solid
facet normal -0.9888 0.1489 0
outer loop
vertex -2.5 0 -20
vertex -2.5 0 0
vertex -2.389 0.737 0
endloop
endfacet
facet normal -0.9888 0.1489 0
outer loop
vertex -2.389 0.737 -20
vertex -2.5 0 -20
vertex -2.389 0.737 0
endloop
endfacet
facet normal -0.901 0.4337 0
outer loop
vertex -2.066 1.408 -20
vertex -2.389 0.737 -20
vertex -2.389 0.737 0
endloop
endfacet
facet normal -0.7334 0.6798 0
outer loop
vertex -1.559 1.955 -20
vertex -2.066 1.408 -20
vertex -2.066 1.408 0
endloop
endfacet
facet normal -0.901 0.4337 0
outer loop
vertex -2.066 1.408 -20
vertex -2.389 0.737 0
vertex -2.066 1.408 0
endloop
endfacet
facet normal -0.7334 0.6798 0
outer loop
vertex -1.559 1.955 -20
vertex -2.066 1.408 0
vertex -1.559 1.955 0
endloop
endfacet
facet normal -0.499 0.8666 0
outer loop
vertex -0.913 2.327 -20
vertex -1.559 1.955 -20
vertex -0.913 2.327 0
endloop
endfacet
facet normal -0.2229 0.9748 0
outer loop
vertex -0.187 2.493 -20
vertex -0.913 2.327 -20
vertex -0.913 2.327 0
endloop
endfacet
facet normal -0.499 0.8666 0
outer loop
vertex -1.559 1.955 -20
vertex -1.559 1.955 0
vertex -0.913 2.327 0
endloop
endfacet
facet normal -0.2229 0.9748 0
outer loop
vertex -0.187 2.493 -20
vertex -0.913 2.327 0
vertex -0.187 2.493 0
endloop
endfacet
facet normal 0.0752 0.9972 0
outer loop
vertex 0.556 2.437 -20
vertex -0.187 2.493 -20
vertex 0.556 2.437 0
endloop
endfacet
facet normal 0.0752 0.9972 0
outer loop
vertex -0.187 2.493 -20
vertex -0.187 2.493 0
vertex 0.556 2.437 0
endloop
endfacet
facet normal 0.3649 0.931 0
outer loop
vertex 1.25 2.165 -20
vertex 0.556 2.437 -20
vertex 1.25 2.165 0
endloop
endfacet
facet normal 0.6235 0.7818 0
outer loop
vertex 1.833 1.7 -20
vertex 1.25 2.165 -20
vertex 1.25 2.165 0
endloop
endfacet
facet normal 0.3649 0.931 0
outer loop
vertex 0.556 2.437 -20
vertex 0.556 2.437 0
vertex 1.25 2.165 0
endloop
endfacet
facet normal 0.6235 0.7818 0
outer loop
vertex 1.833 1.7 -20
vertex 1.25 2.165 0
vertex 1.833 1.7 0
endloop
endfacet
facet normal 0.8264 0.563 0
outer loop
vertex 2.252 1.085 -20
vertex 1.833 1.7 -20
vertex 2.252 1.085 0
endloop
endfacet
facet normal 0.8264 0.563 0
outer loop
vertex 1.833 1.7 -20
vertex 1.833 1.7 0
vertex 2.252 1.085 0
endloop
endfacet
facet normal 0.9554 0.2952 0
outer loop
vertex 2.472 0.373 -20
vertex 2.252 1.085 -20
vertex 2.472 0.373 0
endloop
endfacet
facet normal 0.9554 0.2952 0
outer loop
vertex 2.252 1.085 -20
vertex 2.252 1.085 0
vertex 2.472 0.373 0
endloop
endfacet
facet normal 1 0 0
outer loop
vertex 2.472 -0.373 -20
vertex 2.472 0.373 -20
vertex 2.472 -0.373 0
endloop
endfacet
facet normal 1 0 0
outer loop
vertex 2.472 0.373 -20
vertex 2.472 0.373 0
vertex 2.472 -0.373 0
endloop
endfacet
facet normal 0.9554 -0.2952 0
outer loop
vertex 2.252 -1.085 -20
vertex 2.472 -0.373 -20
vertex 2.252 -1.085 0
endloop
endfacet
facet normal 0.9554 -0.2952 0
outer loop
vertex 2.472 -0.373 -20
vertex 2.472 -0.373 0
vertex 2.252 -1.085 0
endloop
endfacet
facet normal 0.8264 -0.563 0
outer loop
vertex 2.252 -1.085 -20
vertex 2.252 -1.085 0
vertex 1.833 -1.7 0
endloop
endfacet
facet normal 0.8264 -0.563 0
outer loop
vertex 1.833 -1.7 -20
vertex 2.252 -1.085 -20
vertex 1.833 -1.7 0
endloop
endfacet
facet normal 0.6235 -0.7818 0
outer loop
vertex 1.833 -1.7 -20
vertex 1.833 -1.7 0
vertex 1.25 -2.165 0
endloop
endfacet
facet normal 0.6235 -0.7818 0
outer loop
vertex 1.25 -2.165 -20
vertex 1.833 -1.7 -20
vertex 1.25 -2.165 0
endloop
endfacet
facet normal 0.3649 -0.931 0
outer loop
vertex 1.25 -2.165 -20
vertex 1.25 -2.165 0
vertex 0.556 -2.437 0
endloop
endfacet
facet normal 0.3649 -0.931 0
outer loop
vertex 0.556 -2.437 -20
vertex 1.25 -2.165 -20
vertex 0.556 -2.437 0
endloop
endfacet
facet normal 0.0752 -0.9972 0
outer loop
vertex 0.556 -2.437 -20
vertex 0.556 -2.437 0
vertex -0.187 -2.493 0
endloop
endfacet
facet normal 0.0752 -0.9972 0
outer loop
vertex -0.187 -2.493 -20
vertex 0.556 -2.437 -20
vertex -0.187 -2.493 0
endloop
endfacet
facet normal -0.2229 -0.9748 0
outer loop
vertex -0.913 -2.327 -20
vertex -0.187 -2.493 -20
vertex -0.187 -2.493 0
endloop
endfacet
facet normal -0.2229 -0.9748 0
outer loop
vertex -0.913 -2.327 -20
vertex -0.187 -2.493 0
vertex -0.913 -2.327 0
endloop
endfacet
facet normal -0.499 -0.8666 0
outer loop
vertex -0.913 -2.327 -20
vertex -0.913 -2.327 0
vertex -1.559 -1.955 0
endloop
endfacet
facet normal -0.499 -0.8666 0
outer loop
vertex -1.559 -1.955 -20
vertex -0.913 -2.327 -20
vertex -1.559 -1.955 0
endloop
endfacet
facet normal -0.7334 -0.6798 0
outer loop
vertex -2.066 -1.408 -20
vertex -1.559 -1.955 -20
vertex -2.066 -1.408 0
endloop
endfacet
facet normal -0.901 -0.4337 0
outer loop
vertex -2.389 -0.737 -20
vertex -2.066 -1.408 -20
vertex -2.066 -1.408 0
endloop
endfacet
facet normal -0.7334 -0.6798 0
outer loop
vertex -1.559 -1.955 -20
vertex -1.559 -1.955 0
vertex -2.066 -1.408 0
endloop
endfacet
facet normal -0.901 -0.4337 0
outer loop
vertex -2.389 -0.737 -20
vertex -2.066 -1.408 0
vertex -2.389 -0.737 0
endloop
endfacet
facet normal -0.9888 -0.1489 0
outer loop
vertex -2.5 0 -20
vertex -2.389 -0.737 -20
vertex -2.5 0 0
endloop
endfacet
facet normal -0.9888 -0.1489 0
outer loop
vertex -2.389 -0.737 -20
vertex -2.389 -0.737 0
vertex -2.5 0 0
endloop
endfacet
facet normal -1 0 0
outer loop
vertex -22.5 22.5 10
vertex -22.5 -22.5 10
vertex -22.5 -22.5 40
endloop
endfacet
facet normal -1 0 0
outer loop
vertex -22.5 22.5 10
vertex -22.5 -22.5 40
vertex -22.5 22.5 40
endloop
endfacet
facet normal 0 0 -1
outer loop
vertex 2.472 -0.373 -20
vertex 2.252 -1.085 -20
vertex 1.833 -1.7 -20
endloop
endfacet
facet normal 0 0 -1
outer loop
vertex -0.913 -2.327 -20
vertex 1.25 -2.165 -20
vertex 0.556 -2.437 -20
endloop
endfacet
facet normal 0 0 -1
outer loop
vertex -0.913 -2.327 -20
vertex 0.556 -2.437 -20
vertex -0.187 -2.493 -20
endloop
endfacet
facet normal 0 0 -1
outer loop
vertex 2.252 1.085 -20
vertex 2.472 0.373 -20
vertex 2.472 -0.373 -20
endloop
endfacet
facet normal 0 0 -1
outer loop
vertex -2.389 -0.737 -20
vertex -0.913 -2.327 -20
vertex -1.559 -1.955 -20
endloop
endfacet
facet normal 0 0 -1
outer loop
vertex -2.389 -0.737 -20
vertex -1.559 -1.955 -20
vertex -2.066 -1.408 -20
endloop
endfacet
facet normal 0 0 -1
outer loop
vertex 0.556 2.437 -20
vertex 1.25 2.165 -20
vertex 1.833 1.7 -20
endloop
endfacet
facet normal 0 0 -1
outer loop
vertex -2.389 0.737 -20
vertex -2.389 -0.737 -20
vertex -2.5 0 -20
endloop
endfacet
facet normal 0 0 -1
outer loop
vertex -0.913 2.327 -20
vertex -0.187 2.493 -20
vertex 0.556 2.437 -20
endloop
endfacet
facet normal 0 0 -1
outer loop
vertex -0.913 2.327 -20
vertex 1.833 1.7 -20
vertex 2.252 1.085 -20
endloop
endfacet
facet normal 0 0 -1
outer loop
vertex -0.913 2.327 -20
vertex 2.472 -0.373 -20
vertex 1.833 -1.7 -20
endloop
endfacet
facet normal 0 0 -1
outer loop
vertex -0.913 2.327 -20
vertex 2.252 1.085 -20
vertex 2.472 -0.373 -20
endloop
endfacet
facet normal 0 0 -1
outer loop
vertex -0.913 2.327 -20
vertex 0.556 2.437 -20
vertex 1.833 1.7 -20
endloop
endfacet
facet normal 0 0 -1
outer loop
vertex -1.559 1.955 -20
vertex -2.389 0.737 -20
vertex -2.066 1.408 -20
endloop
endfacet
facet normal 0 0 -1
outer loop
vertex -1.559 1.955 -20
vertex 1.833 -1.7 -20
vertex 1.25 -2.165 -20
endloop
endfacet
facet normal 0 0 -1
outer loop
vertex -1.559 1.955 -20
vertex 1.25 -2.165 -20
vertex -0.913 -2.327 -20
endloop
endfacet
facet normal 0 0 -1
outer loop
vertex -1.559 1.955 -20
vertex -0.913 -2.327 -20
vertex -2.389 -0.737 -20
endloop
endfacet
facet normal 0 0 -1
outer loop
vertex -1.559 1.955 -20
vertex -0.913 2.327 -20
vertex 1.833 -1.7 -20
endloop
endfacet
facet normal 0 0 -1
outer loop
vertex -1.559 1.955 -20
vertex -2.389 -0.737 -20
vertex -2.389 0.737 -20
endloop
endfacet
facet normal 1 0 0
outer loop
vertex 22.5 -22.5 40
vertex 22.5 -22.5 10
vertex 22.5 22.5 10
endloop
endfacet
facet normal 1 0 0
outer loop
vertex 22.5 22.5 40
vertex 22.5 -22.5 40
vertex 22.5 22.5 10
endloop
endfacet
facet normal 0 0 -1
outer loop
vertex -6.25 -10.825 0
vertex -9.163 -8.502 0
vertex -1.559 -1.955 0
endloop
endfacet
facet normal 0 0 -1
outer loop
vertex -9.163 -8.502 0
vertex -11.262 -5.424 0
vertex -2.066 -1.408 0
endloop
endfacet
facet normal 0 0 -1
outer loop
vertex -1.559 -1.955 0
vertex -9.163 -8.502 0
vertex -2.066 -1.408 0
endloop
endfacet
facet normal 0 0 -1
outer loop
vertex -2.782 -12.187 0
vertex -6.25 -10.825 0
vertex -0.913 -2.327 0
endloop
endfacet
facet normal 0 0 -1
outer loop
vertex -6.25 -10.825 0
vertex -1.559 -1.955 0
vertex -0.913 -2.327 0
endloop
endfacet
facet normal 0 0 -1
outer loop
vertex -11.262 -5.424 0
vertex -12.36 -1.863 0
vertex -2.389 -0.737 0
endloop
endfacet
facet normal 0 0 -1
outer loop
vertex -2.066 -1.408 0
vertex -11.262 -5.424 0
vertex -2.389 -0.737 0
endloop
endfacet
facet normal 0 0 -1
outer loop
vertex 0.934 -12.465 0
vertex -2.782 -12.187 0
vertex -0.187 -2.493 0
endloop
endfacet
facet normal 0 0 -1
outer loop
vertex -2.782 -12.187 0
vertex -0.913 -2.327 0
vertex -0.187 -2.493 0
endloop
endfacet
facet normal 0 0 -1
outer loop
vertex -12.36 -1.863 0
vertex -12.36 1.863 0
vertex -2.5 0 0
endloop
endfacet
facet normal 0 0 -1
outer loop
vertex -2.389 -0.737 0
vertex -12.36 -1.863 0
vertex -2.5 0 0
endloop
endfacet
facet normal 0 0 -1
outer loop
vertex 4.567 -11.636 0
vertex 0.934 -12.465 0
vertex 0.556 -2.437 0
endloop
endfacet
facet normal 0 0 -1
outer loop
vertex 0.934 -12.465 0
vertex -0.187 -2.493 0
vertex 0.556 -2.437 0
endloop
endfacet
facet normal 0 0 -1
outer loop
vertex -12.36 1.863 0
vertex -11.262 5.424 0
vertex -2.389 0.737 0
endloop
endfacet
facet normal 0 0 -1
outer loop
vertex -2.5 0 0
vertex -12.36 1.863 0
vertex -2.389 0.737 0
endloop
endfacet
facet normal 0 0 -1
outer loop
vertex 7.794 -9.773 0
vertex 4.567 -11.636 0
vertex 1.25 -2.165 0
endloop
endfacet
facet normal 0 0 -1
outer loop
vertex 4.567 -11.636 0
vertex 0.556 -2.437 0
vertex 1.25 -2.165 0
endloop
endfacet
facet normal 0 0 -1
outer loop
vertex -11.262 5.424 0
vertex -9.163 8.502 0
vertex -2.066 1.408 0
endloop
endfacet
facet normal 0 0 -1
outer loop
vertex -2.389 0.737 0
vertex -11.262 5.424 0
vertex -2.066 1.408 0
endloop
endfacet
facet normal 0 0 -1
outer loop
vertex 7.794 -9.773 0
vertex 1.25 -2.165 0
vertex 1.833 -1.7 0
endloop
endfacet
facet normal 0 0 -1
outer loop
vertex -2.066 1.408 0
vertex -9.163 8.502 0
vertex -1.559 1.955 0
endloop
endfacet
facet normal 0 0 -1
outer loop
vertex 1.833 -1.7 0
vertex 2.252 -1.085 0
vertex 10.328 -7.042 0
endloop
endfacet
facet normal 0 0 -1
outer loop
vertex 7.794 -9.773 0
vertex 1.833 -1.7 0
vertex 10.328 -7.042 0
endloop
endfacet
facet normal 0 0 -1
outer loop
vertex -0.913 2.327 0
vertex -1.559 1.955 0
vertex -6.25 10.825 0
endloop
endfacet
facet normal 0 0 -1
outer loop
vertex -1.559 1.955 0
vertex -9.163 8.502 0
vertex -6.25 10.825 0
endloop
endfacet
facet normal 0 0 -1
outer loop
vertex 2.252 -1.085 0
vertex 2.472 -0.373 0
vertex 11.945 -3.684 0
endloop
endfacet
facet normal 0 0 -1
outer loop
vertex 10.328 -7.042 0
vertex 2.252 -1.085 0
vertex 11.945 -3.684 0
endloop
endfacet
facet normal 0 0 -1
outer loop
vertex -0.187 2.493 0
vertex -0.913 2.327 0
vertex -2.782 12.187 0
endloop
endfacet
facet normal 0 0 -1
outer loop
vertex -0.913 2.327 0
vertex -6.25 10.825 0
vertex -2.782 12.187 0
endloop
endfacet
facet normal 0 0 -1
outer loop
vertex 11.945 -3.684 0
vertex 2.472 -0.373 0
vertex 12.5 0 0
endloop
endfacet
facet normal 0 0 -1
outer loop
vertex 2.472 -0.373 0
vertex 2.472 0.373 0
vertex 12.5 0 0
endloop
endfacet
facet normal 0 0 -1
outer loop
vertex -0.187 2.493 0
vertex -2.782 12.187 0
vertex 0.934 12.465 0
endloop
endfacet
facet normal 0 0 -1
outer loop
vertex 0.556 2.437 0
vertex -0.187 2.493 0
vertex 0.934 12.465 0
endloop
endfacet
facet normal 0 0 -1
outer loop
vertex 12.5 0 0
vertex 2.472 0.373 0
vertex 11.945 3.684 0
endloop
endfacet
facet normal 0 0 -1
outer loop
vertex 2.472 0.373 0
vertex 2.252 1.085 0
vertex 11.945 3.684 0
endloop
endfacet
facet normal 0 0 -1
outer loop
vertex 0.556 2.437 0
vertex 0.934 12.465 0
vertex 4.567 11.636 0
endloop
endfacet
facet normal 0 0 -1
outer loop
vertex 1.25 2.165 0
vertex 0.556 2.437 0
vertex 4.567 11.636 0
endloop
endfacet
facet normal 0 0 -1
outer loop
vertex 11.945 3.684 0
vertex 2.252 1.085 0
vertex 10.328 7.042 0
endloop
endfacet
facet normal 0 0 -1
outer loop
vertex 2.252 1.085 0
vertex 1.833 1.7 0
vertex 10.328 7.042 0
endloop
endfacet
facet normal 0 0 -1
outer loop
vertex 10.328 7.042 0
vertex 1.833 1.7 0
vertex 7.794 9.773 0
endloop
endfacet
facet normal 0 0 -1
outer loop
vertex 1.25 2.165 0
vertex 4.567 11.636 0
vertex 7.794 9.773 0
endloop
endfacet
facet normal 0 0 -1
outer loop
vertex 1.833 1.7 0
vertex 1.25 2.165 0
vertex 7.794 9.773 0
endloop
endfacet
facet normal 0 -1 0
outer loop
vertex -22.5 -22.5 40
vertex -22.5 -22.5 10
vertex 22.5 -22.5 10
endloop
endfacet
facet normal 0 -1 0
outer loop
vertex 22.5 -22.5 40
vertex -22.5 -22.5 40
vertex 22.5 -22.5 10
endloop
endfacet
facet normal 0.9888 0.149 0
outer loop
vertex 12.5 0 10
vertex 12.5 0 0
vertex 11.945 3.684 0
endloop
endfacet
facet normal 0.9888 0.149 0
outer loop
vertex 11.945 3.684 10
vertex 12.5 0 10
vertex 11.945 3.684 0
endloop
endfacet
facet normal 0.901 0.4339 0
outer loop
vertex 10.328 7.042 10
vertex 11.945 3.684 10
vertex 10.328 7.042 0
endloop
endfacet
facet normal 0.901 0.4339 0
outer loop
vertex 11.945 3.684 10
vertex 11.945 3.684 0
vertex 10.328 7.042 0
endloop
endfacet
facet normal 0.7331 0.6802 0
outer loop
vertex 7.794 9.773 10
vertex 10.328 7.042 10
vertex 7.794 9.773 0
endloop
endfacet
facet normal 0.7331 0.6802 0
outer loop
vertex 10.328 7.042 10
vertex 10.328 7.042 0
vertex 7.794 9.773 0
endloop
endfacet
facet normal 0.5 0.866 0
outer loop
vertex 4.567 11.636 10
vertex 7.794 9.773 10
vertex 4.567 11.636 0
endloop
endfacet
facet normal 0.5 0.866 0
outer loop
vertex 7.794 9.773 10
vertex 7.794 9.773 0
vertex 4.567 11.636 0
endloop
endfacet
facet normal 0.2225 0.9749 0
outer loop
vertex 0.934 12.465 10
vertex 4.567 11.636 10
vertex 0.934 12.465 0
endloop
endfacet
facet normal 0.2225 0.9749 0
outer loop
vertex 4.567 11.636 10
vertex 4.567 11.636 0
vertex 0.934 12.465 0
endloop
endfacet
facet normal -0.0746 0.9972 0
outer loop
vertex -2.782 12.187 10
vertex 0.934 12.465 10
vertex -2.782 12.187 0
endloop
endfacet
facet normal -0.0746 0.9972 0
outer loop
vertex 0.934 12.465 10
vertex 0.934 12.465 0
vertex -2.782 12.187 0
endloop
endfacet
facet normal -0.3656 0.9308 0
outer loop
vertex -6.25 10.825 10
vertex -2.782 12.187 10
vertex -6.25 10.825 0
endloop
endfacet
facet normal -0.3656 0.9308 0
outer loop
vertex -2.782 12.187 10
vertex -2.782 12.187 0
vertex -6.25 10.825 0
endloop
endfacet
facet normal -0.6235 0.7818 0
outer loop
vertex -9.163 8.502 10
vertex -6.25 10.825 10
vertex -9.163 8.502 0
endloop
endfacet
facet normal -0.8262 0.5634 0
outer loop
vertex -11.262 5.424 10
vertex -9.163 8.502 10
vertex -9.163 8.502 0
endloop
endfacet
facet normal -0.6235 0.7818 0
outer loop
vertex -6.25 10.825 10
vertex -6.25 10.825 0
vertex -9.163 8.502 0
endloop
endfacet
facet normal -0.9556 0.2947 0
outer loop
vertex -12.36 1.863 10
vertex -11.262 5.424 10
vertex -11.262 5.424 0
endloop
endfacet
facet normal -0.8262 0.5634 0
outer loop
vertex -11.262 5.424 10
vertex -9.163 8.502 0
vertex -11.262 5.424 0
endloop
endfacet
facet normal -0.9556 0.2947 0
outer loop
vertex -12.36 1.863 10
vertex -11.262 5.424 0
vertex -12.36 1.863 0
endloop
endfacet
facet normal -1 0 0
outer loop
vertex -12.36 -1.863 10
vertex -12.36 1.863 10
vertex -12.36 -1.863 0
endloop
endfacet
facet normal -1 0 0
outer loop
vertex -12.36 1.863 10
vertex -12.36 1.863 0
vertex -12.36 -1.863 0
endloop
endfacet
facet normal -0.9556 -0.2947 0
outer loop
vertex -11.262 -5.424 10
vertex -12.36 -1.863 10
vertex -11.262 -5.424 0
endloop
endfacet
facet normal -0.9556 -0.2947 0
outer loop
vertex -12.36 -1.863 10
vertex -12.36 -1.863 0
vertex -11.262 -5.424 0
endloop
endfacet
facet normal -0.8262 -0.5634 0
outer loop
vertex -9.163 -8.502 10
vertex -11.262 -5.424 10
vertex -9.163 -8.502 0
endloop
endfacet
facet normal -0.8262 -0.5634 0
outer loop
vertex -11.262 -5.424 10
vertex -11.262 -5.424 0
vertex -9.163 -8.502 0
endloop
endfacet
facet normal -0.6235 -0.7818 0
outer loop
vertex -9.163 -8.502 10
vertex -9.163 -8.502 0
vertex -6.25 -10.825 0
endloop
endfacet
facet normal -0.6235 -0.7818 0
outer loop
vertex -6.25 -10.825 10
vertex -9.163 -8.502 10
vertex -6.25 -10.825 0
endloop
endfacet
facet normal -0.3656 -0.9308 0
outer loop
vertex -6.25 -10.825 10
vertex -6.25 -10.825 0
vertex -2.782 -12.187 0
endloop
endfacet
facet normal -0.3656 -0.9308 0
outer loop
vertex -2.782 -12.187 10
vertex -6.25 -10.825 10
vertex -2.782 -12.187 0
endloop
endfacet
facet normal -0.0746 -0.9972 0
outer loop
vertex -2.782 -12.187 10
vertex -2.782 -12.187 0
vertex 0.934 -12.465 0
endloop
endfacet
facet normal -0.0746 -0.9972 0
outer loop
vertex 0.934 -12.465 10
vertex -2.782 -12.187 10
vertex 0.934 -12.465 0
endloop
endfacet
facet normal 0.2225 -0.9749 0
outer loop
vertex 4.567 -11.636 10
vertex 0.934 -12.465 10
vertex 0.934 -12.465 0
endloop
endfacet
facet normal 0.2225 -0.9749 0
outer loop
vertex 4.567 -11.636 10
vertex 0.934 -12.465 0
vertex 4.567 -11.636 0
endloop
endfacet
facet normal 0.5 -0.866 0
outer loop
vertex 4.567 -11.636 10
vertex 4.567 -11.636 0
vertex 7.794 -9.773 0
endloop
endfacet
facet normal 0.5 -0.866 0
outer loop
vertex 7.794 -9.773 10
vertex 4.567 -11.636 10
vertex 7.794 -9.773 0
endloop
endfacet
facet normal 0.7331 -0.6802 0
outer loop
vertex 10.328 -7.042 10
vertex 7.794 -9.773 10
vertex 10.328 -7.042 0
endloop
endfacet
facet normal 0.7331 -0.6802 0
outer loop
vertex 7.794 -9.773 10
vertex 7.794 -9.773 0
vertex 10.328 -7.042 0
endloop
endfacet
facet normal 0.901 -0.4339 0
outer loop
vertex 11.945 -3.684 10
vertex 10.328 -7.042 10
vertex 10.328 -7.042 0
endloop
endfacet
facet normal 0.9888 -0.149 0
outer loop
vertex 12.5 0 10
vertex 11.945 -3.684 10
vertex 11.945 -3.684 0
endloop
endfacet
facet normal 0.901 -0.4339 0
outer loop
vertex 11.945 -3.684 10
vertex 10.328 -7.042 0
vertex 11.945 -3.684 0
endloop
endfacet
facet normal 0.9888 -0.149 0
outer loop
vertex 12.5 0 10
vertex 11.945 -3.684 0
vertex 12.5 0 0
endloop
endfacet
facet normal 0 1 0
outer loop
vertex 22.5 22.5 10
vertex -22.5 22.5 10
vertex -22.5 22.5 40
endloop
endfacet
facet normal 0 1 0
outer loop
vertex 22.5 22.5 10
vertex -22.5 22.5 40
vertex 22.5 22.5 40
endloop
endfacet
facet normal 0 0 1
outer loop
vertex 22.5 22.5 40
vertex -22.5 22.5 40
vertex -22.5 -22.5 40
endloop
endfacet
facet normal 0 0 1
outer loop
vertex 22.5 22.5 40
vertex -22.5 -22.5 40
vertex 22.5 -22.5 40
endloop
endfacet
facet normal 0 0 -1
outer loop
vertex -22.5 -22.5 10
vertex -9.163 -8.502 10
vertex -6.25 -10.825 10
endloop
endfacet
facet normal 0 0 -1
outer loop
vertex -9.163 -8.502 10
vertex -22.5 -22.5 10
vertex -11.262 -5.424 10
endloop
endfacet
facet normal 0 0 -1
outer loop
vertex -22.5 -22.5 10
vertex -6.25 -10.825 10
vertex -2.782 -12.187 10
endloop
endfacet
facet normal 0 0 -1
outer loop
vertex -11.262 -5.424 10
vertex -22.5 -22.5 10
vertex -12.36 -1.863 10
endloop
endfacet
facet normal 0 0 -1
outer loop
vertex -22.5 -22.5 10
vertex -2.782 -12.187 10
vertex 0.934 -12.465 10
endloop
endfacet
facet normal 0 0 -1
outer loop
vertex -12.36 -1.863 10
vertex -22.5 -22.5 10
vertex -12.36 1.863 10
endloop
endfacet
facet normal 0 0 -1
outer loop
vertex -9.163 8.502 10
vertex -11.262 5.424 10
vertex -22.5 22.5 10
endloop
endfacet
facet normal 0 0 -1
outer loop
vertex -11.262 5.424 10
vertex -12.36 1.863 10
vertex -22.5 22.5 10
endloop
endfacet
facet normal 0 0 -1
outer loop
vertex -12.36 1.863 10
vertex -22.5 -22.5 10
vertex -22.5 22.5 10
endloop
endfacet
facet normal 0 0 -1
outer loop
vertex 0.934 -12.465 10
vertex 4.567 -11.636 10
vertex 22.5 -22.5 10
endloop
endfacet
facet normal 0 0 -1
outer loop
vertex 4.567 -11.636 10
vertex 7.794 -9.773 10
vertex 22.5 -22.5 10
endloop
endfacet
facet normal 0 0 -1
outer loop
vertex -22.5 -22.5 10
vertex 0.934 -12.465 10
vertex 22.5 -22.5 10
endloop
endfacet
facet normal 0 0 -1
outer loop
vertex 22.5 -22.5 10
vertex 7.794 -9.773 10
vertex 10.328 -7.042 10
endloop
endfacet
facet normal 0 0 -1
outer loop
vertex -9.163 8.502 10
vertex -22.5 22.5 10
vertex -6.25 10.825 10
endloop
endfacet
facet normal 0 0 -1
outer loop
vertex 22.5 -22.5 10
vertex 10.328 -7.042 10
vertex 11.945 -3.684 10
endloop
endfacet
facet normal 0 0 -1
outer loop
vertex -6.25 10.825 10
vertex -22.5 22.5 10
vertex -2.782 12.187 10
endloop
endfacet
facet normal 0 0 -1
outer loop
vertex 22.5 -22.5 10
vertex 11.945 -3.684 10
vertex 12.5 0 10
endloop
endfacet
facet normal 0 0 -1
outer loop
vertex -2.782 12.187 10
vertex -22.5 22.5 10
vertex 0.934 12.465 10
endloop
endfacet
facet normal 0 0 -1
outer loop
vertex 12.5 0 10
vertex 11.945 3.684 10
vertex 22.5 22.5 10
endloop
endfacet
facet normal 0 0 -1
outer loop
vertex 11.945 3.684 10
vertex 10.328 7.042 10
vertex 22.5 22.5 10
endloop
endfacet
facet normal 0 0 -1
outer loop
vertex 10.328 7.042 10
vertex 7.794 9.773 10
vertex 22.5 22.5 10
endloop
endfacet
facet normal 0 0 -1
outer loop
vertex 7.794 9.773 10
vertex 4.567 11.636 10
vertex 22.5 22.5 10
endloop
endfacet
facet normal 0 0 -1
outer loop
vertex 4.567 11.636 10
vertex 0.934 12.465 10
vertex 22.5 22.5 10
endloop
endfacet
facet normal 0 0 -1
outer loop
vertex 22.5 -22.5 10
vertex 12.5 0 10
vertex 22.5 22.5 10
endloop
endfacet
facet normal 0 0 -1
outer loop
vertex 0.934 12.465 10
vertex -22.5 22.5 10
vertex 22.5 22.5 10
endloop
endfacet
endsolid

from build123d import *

# Parameters (mm, degrees)
SKETCH1_R           = 12.5
BOSS_EXTRUDE1_DEPTH = 10
SKETCH2_W           = 45
SKETCH2_H           = 45
BOSS_EXTRUDE2_DEPTH = 30
SKETCH4_R           = 2.5
BOSS_EXTRUDE3_DEPTH = 20


with BuildPart() as part:
    # Sketch1 → Boss-Extrude1 (new body)
    with BuildSketch(Plane.XY):
        Circle(SKETCH1_R)
    extrude(amount=BOSS_EXTRUDE1_DEPTH)

    # Sketch2 → Boss-Extrude2 (add)
    with BuildSketch(Plane.XY.offset(10)):
        Rectangle(SKETCH2_W, SKETCH2_H)
    extrude(amount=BOSS_EXTRUDE2_DEPTH)

    # Sketch4 → Boss-Extrude3 (add)
    with BuildSketch(Plane(origin=(0, 0, 0), x_dir=(-1, 0, 0), z_dir=(0, 0, -1))):
        Circle(SKETCH4_R)
    extrude(amount=BOSS_EXTRUDE3_DEPTH)


solid = part.part
